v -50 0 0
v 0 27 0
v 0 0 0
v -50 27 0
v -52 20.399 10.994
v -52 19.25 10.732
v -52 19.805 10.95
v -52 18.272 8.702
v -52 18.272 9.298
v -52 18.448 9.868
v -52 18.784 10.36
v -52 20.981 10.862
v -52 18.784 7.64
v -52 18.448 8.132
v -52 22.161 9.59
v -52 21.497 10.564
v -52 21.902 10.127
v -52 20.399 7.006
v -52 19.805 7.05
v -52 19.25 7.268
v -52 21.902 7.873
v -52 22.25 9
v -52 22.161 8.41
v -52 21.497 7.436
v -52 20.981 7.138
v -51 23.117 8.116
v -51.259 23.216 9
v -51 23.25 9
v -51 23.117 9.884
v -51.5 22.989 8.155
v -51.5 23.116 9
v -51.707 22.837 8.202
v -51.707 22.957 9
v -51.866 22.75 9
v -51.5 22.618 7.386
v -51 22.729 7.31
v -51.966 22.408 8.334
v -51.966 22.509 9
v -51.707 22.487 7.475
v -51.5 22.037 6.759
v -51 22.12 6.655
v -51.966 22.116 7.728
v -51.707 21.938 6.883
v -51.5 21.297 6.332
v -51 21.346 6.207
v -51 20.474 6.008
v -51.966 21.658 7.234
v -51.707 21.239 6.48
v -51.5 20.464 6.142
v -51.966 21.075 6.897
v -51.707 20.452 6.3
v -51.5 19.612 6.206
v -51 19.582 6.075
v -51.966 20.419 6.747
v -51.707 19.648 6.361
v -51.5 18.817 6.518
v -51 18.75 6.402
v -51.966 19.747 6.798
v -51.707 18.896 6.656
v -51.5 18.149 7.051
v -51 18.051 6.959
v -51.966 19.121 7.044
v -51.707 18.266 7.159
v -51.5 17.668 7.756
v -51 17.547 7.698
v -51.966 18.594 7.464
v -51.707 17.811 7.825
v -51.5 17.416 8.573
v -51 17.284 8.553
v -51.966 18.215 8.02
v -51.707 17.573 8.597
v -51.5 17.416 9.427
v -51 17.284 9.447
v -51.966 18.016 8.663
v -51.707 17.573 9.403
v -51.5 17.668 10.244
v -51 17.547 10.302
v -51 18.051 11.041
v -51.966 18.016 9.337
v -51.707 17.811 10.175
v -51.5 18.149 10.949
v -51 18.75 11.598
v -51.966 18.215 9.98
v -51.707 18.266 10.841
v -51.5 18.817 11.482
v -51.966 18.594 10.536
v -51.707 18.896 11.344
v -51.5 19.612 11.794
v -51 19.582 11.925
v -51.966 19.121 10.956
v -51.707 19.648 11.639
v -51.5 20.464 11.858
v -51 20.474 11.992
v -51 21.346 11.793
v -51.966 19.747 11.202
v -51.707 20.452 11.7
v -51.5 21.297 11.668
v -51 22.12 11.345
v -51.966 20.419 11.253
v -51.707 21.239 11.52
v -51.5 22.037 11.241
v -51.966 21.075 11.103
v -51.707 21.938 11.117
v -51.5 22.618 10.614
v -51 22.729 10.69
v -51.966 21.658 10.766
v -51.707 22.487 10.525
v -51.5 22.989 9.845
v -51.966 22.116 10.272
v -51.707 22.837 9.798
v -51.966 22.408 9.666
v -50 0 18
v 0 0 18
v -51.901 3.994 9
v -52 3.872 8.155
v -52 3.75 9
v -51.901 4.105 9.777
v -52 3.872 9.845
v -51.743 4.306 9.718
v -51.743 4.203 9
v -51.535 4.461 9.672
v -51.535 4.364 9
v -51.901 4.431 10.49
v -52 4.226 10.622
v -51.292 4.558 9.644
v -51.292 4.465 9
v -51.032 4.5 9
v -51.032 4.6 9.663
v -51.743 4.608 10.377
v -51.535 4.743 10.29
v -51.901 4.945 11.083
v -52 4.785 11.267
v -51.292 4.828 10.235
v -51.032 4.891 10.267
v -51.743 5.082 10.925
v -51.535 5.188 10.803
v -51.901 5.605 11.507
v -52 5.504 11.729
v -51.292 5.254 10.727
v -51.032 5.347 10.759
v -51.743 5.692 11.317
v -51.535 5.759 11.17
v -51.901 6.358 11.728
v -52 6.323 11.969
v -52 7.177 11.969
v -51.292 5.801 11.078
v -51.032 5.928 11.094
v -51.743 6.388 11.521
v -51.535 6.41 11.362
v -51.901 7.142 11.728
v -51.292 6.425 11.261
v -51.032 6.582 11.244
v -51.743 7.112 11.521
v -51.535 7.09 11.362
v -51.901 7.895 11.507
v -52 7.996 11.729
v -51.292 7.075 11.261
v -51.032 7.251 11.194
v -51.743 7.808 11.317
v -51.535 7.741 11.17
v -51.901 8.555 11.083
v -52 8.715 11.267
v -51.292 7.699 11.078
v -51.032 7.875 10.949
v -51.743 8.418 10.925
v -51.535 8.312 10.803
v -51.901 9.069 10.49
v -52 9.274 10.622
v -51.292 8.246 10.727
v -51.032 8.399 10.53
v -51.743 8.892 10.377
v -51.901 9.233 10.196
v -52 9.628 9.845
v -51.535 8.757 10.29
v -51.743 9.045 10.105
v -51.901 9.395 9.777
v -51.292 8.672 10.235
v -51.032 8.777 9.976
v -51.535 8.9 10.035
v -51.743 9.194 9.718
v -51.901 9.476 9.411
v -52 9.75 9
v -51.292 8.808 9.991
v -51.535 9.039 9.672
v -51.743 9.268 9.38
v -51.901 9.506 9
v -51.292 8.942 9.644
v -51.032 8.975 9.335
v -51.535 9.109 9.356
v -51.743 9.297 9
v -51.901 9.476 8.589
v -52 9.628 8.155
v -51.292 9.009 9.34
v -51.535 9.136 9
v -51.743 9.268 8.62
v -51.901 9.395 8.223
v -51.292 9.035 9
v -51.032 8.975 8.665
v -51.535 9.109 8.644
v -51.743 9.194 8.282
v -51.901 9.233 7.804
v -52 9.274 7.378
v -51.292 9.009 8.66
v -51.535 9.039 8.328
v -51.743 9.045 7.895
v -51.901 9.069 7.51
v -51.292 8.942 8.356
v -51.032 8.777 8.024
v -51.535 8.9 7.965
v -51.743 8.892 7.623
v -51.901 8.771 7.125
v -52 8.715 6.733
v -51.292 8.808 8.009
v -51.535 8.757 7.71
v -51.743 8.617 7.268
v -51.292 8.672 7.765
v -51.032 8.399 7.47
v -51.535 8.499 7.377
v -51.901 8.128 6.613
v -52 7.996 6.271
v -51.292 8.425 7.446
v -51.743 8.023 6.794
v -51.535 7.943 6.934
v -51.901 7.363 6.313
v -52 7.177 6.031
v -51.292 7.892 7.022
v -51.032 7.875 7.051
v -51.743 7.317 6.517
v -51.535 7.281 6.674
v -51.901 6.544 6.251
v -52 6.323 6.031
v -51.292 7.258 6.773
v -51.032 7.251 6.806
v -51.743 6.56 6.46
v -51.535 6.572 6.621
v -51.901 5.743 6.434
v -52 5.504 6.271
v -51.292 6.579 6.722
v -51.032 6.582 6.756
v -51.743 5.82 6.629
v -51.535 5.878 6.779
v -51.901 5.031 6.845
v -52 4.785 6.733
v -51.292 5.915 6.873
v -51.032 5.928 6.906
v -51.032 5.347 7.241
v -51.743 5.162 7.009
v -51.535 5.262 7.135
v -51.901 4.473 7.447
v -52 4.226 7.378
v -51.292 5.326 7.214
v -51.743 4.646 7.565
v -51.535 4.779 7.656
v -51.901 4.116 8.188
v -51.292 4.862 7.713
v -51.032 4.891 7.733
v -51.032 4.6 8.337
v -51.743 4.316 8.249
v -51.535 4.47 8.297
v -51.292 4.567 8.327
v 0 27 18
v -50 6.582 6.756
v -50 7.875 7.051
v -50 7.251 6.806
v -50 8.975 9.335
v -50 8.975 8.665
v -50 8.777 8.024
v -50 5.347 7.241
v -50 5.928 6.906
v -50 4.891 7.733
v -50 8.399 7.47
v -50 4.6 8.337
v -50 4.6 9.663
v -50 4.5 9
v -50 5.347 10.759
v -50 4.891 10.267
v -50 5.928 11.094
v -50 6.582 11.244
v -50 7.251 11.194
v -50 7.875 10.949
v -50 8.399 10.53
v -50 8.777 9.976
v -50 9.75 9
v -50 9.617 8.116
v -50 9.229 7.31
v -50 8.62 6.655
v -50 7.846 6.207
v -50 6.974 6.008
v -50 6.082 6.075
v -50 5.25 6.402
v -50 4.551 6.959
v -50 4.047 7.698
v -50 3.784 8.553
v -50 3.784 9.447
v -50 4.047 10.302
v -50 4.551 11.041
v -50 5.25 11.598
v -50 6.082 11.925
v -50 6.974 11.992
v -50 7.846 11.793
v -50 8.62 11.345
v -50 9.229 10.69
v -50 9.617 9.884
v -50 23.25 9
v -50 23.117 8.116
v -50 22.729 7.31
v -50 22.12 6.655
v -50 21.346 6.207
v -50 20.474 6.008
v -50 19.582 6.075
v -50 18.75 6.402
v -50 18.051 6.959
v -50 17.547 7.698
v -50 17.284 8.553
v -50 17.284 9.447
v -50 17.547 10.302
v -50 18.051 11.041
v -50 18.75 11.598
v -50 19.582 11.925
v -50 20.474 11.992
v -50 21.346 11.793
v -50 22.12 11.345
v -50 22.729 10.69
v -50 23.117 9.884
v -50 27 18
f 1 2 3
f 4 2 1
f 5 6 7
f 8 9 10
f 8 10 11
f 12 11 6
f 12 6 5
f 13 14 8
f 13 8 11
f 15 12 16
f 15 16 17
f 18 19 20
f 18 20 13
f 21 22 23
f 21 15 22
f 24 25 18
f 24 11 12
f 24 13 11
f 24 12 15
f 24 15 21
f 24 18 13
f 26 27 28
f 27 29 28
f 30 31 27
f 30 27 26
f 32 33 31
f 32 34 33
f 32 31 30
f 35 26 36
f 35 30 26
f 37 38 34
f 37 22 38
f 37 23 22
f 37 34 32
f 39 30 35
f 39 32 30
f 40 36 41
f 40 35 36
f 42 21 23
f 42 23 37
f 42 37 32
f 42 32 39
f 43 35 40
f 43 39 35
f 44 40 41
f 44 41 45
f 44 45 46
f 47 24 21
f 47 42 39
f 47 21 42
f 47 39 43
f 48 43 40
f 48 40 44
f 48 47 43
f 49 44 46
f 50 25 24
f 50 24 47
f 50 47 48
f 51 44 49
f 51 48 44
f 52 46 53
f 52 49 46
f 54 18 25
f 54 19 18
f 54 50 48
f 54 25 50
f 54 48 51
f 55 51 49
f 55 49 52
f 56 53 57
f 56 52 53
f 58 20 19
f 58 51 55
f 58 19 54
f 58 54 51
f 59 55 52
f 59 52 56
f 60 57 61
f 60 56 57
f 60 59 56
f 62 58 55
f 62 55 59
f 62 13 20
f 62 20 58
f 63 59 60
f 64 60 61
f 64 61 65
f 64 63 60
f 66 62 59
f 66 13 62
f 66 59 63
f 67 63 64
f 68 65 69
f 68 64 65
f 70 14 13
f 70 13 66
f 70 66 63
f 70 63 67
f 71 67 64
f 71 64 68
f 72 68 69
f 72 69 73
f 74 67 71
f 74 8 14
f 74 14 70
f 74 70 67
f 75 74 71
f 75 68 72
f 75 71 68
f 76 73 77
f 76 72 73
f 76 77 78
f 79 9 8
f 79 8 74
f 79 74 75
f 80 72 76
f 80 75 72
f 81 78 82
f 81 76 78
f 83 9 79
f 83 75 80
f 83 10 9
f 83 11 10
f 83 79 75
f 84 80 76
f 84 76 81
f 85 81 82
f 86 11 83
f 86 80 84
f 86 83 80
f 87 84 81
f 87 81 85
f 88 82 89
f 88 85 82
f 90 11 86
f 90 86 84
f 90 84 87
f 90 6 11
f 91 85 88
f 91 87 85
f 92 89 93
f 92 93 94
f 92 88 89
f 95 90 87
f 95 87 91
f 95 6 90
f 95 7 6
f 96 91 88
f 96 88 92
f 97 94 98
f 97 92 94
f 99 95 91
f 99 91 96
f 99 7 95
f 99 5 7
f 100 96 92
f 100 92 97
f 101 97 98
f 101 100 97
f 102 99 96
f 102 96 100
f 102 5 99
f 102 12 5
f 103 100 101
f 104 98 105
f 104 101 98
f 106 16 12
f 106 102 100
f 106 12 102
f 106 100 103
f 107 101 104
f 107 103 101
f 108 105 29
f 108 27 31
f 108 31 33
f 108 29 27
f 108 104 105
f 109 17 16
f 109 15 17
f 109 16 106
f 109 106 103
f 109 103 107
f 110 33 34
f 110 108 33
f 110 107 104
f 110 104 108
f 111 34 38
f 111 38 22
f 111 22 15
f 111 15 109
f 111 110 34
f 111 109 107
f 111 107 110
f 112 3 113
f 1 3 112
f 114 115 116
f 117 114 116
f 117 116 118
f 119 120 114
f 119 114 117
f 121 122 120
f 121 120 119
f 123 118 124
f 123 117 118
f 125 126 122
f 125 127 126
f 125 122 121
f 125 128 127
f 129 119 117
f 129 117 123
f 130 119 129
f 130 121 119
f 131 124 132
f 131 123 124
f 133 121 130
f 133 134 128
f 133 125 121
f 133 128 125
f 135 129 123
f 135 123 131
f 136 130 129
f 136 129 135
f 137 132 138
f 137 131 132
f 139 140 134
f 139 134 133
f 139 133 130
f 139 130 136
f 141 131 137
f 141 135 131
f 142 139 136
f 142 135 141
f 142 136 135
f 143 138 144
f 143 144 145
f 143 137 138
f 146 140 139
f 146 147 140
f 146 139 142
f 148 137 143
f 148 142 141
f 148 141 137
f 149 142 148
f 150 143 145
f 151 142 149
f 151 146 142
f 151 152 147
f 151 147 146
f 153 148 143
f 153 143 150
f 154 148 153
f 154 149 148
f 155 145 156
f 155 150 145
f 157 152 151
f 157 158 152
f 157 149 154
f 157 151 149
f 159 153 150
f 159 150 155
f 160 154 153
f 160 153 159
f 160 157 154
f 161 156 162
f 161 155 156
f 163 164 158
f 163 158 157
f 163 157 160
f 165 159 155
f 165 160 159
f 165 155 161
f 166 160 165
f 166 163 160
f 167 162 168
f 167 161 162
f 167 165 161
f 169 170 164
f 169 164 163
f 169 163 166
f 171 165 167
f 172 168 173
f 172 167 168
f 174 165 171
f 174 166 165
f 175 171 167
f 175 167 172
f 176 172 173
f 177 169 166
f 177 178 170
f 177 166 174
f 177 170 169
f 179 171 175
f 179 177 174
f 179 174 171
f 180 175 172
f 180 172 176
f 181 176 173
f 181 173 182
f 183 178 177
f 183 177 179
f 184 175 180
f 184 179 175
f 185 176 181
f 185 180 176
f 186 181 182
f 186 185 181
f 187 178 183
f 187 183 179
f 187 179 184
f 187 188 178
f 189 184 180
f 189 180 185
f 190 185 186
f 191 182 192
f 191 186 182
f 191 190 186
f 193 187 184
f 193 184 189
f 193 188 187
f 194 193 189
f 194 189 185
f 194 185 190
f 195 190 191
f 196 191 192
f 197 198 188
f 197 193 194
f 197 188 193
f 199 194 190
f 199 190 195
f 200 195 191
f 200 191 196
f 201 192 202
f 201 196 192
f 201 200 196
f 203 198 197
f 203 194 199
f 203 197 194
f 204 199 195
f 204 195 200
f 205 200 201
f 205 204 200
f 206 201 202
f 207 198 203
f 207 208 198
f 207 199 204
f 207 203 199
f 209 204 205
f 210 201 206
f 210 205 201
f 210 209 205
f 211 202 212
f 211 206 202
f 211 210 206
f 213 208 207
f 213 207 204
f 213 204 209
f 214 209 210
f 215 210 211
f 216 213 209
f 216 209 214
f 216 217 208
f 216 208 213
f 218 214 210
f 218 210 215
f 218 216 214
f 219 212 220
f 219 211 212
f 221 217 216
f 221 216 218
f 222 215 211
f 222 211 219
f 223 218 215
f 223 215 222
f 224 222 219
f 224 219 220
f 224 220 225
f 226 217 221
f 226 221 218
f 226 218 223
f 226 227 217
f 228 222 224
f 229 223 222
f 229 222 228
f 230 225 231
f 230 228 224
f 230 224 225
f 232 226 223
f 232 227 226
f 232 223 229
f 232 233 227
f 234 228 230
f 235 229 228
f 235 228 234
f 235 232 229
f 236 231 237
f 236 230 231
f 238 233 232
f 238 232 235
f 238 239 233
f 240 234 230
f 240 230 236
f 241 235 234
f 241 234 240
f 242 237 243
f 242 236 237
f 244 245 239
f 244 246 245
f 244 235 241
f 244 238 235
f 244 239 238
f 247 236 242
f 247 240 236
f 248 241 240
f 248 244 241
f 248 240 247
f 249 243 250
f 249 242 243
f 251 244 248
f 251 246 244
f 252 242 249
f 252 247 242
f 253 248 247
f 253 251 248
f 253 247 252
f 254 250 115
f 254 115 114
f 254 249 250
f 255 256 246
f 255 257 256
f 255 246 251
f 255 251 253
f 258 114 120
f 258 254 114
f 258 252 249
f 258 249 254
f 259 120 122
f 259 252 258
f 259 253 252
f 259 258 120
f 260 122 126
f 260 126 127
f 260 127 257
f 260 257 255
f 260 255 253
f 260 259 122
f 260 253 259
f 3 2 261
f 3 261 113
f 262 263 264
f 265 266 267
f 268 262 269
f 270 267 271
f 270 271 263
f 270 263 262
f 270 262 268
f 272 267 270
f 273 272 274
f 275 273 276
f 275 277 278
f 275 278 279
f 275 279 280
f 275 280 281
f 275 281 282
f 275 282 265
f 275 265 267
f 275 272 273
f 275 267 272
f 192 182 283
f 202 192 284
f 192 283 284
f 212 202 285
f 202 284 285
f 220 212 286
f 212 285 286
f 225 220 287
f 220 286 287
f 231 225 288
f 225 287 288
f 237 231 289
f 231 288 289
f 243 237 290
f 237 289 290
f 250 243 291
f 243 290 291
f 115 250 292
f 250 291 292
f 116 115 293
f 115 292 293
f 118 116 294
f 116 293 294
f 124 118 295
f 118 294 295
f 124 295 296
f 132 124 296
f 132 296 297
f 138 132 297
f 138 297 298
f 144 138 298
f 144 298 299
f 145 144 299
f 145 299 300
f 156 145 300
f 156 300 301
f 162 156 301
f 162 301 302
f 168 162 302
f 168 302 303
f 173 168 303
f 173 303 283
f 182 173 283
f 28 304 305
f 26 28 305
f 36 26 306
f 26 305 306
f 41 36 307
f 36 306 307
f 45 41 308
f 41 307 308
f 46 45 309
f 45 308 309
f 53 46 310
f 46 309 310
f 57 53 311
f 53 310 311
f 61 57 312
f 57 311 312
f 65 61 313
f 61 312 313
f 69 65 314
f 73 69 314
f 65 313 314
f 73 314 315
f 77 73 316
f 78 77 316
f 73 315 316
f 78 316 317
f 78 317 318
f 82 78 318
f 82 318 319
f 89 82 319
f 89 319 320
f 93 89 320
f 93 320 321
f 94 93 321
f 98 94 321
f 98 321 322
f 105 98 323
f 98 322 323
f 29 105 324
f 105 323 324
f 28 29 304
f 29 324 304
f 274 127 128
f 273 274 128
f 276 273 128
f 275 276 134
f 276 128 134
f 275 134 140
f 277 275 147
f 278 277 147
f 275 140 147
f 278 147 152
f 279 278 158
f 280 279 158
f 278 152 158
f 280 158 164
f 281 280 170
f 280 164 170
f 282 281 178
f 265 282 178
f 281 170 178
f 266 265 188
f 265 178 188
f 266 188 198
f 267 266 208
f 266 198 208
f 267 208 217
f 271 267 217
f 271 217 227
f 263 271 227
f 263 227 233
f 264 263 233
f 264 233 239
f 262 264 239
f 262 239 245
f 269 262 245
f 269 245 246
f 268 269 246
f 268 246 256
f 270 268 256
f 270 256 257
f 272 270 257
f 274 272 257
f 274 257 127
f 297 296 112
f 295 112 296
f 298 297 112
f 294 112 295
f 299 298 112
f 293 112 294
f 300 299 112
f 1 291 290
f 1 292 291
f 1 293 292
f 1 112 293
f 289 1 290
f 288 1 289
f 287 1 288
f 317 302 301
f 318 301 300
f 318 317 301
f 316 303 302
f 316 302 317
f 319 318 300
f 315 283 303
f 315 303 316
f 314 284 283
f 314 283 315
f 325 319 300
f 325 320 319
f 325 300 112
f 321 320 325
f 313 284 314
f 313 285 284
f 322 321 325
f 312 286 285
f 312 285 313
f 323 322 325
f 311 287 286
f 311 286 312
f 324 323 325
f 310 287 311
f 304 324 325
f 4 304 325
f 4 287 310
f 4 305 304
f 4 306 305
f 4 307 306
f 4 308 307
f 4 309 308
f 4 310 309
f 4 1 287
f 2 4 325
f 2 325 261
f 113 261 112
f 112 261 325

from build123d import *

# Parameters (mm, degrees)
BOSS_EXTRUDE1_DEPTH = 18
SKETCH2_R           = 3.0000000000000004
SKETCH2_R_2         = 3.0000000000000013
BOSS_EXTRUDE3_DEPTH = 2
FILLET1_R           = 1
SKETCH3_R           = 2.250000000000001
CUT_EXTRUDE1_DEPTH  = 2
FILLET3_R           = 1


with BuildPart() as part:
    # Sketch1 → Boss-Extrude1 (new body)
    with BuildSketch(Plane.XY):
        Polygon((-50, 27), (0, 27.000000000000007), (0, 0), (-49.999999999999986, 0), align=None)
    extrude(amount=BOSS_EXTRUDE1_DEPTH)

    # Sketch2 → Boss-Extrude3 (add)
    with BuildSketch(Plane.ZY.offset(49.999999999999986)):
        with Locations(Location((9, 20.250000000000025, 0), (0, 0, 90))):
            Circle(SKETCH2_R)
        with Locations(Location((9, 6.749999999999998, 0), (0, 0, 90))):
            Circle(SKETCH2_R_2)
    extrude(amount=BOSS_EXTRUDE3_DEPTH)

    # Fillet1
    fillet1_edges = [part.edges().sort_by_distance(p)[0] for p in [
        (-51.99999999999999, 17.249999999999996, 9),
    ]]
    fillet(fillet1_edges, radius=FILLET1_R)

    # Sketch3 → Cut-Extrude1 (cut)
    with BuildSketch(Plane.ZY.offset(51.99999999999999)):
        with Locations(Location((9, 6.749999999999998, 0), (0, 0, 270))):
            Circle(SKETCH3_R)
    extrude(amount=-CUT_EXTRUDE1_DEPTH, mode=Mode.SUBTRACT)

    # Fillet3
    # the kernel refuses this fillet: 1 mm, written as the material it takes off along each edge
    with BuildSketch(Plane(origin=(-51.99999999999999, 6.749999999999972, 9), x_dir=(0, -1, 0), z_dir=(0, 0, -1))) as fillet3_piece_1:
        with BuildLine():
            CenterArc((3.25, -0.9682458365518585), FILLET3_R, 104.47751218592994, 75.52248781407006)
            Line((2.25, -0.9682458365518585), (2.2300000000000004, -0.9682458365518585))
            Line((2.2300000000000004, -0.9682458365518585), (2.2300000000000013, 0))
            Line((2.2300000000000013, 0), (2.250000000000001, 0.02000000000000313))
            ThreePointArc((2.250000000000001, 0.02000000000000313), (2.625000000000001, 0.01999999999999602), (2.9950000000000006, 0.01936491673102836))
            Line((2.9950000000000006, 0.01936491673102836), (3.0000000000000004, -7.11e-15))
        make_face()
    revolve(axis=Axis((-51.99999999999999, 6.749999999999972, 9), (-1, -5.1e-16, 0)), mode=Mode.SUBTRACT)


solid = part.part
